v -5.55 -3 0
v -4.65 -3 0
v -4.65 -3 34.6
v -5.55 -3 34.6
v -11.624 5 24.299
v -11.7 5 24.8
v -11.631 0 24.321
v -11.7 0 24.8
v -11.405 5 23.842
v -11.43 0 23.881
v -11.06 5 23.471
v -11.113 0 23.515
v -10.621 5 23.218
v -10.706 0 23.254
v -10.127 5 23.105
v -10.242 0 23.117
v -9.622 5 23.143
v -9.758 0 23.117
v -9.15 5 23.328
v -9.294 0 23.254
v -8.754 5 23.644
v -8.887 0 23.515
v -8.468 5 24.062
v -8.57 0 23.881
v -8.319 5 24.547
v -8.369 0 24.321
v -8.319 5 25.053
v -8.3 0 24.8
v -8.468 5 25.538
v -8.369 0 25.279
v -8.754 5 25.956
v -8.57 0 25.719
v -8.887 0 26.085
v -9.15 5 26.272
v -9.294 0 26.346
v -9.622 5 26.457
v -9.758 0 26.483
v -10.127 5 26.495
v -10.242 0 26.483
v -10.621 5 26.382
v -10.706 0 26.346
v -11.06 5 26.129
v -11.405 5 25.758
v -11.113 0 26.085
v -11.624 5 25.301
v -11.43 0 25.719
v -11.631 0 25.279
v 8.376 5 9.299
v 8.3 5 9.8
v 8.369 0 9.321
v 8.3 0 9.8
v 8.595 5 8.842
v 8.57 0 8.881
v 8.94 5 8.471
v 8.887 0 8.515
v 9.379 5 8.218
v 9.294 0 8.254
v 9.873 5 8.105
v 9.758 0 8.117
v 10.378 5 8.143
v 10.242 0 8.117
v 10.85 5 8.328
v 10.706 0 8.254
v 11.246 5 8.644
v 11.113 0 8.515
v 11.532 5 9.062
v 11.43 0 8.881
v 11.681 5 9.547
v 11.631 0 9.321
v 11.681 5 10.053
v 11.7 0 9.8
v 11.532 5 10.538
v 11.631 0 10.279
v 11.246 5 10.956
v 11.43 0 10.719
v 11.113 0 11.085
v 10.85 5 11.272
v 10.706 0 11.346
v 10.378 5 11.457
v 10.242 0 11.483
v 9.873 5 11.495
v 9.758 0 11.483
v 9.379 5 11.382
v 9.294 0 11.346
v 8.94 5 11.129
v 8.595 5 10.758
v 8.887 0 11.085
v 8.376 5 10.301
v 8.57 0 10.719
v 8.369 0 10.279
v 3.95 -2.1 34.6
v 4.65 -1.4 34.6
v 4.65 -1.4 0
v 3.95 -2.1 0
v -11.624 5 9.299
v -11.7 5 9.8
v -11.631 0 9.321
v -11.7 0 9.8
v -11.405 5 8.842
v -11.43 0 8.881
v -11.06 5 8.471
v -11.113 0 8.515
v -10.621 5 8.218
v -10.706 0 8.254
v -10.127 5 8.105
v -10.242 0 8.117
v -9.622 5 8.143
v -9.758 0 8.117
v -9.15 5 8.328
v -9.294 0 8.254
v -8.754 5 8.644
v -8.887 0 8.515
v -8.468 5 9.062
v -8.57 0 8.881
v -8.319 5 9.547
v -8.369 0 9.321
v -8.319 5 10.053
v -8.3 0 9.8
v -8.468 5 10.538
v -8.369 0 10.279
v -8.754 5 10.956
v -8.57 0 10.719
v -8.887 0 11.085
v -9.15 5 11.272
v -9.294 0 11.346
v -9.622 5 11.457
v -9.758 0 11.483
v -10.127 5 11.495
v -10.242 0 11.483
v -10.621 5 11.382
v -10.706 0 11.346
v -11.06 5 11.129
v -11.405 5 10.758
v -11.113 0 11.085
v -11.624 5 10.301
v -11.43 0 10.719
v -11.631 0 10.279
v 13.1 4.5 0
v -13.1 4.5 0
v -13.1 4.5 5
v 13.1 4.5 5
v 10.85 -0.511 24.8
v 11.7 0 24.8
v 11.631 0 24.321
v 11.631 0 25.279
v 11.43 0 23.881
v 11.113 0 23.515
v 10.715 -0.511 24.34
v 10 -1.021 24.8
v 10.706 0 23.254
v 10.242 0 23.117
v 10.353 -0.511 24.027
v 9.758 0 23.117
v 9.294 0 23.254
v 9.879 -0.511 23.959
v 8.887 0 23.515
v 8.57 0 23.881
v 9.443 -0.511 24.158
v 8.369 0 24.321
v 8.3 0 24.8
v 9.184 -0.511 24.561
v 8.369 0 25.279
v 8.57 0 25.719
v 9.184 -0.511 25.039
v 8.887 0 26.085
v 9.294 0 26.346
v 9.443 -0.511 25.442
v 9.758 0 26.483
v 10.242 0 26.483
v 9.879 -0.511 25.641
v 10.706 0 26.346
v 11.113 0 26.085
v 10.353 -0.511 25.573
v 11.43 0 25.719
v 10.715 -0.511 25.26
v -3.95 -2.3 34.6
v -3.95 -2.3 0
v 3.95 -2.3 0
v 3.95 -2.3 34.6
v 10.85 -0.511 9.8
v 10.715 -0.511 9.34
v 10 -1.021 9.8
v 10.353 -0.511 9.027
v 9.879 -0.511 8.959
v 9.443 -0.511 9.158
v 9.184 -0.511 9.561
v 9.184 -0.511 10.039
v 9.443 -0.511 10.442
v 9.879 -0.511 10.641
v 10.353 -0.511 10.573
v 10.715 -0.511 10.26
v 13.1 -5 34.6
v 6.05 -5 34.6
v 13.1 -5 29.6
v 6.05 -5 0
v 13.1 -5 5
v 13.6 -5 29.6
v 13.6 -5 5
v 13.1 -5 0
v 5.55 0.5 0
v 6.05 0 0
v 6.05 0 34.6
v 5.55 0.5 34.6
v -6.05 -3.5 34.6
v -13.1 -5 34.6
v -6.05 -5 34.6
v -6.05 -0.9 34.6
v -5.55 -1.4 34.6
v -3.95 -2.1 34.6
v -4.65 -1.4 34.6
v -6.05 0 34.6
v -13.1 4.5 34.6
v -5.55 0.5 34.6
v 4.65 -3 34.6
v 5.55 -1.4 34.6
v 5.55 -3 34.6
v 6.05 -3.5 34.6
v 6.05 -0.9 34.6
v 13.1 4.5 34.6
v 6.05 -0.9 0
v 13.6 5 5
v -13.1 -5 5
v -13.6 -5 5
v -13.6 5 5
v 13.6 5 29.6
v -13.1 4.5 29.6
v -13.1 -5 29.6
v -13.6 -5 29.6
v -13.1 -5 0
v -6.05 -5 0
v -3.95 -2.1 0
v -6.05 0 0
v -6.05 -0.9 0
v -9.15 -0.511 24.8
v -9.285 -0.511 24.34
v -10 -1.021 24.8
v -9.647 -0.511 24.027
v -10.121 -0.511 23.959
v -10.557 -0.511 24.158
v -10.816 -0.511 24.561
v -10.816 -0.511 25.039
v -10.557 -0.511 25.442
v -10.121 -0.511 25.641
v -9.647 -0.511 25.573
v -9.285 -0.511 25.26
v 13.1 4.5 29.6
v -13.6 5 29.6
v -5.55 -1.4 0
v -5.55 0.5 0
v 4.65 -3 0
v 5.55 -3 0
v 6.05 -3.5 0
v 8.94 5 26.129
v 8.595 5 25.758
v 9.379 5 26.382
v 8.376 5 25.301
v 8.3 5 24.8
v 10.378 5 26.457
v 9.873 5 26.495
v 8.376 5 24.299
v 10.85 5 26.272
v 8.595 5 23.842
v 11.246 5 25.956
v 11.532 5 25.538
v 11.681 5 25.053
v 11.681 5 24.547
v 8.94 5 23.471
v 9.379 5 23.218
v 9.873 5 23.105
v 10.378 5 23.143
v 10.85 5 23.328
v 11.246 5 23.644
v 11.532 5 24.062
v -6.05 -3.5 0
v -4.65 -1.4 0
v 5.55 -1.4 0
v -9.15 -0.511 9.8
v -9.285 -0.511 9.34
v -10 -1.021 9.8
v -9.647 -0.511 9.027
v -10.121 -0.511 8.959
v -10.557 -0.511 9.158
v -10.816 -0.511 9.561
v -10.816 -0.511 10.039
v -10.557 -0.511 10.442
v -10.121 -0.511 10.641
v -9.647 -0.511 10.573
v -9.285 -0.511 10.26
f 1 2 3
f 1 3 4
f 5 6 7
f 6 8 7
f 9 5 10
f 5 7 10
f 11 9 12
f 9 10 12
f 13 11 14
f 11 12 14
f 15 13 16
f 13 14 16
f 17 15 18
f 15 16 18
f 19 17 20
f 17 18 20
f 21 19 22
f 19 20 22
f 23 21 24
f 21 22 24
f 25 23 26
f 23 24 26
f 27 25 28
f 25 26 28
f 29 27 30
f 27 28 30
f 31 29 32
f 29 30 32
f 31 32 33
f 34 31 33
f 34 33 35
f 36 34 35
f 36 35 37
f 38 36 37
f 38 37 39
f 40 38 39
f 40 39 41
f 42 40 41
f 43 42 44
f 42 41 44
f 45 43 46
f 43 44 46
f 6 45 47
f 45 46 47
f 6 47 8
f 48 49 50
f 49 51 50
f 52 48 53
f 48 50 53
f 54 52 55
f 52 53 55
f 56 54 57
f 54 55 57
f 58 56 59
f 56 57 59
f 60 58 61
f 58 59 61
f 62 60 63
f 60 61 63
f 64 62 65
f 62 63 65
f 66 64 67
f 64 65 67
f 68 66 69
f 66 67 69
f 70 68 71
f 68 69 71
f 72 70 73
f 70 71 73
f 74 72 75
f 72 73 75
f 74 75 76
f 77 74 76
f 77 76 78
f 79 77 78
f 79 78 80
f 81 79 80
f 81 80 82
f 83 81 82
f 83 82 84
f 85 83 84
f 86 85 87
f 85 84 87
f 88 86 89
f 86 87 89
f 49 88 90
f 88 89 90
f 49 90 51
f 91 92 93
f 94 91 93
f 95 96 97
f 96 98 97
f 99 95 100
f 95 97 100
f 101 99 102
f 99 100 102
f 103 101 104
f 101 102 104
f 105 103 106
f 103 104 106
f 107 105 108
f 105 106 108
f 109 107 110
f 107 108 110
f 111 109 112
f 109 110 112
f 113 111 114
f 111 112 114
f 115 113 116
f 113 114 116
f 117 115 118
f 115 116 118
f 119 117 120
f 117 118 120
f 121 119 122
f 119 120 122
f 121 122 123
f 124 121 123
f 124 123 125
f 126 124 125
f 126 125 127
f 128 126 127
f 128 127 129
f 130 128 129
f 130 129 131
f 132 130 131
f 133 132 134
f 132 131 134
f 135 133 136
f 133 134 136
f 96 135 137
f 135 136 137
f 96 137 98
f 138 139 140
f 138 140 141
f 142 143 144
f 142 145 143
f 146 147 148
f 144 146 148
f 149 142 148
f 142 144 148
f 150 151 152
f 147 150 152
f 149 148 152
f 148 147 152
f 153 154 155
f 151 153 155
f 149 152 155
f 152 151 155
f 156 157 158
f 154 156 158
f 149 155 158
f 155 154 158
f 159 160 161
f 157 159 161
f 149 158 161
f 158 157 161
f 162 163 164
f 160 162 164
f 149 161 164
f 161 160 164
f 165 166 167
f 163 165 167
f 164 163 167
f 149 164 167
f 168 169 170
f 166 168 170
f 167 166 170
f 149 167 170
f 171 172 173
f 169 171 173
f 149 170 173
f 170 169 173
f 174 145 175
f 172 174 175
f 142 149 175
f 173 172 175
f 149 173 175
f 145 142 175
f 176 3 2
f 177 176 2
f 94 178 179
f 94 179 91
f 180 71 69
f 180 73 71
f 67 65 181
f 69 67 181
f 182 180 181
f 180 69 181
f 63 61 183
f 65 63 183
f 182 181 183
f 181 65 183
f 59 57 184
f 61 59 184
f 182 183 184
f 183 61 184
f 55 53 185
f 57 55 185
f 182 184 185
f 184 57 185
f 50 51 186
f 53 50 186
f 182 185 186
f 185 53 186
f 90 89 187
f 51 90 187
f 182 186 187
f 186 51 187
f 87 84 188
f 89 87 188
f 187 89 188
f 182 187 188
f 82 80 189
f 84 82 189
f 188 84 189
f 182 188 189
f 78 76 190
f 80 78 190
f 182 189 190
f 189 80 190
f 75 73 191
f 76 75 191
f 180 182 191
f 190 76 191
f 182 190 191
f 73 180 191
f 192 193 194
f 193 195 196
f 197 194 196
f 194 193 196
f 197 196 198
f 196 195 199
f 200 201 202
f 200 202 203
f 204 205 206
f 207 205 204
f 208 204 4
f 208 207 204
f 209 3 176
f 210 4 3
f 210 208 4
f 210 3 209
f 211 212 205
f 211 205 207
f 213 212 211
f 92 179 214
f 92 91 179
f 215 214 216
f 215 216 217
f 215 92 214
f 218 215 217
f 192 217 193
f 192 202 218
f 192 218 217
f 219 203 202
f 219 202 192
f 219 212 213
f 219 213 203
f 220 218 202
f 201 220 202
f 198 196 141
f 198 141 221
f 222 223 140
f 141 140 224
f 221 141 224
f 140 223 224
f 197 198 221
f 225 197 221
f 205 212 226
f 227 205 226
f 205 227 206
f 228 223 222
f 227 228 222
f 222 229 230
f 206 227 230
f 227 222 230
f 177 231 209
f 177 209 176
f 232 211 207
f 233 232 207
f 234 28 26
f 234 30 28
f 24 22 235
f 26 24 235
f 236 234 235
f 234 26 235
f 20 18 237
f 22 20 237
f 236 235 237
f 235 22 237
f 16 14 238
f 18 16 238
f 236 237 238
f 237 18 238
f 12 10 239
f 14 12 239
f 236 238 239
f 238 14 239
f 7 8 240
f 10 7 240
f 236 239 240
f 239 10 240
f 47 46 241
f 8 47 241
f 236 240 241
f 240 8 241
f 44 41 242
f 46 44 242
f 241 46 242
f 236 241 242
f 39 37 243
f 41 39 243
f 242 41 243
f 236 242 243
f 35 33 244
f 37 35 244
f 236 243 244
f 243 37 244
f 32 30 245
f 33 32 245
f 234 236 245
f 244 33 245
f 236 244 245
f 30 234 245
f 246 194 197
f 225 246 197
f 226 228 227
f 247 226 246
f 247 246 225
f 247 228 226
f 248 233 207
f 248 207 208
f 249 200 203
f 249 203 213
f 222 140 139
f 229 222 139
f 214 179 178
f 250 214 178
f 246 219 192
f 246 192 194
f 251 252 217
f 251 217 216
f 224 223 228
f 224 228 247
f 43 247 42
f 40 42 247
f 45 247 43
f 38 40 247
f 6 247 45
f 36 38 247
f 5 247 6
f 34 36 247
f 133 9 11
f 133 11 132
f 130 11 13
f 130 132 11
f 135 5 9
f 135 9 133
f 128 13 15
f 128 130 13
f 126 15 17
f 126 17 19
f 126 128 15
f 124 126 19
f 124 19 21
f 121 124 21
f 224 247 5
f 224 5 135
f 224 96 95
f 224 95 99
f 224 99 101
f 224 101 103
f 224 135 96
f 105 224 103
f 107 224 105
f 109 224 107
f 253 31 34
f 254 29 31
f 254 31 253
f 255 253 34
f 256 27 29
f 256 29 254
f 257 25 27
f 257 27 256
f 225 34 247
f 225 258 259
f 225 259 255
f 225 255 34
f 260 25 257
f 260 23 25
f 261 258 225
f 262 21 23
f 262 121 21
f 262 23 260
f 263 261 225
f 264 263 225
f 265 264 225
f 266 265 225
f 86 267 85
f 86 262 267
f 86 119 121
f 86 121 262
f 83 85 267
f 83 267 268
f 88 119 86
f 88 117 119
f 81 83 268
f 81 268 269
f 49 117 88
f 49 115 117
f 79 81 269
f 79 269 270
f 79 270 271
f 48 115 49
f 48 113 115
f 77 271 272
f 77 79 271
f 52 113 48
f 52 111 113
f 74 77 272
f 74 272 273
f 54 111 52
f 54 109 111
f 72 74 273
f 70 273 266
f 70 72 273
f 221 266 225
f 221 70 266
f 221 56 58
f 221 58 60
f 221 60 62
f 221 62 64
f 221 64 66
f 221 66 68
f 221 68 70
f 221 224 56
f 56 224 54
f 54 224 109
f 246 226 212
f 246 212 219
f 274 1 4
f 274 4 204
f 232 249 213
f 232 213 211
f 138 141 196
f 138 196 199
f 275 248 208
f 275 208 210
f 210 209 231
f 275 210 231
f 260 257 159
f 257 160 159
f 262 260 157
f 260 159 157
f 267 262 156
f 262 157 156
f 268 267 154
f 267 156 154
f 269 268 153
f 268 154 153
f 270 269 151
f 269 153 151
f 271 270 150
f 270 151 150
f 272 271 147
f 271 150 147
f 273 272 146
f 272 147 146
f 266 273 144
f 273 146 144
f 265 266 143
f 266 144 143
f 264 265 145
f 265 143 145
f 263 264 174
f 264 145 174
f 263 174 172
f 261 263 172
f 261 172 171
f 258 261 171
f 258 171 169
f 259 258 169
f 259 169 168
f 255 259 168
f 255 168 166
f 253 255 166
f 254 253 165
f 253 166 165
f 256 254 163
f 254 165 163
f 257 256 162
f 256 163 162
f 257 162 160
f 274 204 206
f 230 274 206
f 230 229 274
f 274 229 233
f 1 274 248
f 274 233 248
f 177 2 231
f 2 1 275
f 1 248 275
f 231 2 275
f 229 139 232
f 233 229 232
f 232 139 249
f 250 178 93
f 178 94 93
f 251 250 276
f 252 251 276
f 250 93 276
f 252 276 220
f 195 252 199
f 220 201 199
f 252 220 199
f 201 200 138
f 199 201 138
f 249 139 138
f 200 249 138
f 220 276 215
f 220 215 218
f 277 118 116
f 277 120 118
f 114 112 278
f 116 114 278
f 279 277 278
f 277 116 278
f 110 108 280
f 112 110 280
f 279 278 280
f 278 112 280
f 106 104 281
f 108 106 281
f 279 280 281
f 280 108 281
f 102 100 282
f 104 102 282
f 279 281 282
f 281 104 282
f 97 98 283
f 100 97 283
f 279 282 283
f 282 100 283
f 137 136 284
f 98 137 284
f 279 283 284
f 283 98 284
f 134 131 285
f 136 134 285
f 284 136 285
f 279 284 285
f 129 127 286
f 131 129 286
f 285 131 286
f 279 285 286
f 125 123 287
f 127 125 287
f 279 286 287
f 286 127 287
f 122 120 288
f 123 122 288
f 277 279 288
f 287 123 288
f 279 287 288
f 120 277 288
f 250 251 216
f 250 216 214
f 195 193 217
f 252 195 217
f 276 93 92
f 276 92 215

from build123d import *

# Parameters (mm, degrees)
SKETCH1_W                = 27.2
SKETCH1_H                = 10
BOSS_EXTRUDE1_DEPTH      = 34.6
CUT_EXTRUDE1_DEPTH       = 1
CUT_EXTRUDE1_DEPTH_BACK  = 34.6
CHAMFER1_SIZE            = 0.7
M3_CLEARANCE_HOLE1_D     = 3.4
M3_CLEARANCE_HOLE1_DEPTH = 5
M3_CLEARANCE_HOLE1_TIP   = 1.021463052
SKETCH7_W                = 27.2
SKETCH7_H                = 5
CUT_EXTRUDE2_DEPTH       = 0.5
SKETCH8_W                = 5
SKETCH8_H                = 9.5
CUT_EXTRUDE3_DEPTH       = 0.5


with BuildPart() as part:
    # Sketch1 → Boss-Extrude1 (new body)
    with BuildSketch(Plane.XY):
        Rectangle(SKETCH1_W, SKETCH1_H)
    extrude(amount=BOSS_EXTRUDE1_DEPTH)

    # Sketch2 → Cut-Extrude1 (cut, two sides)
    with BuildSketch(Plane.XY.offset(34.6)) as cut_extrude1_sk:
        Polygon((-5.55, -3), (-6.05, -3.5), (-6.05, -5), (6.05, -5), (6.05, -3.5), (5.55, -3), (3.95, -3), (3.95, -1.4), (5.55, -1.4), (6.05, -0.9), (6.05, 0), (5.55, 0.5), (-5.55, 0.5), (-6.05, 0), (-6.05, -0.9), (-5.55, -1.4), (-3.95, -1.4), (-3.95, -3), align=None)
    extrude(amount=CUT_EXTRUDE1_DEPTH, mode=Mode.SUBTRACT)
    extrude(cut_extrude1_sk.sketch, amount=-CUT_EXTRUDE1_DEPTH_BACK, mode=Mode.SUBTRACT)

    # Chamfer1
    chamfer1_edges = [part.edges().sort_by_distance(p)[0] for p in [
        (-3.95, -3, 17.3),
        (3.95, -3, 17.3),
        (3.95, -1.4, 17.3),
        (-3.95, -1.4, 17.3),
    ]]
    chamfer(chamfer1_edges, length=CHAMFER1_SIZE)

    # M3 Clearance Hole1
    with Locations(Plane(origin=(0, 5, 0), x_dir=(1, 0, 0), z_dir=(0, 1, 0))):
        with Locations((-10, -24.8), (-10, -9.8), (10, -9.8), (10, -24.8)):
            Hole(M3_CLEARANCE_HOLE1_D / 2, depth=M3_CLEARANCE_HOLE1_DEPTH)
            with Locations((0, 0, -(M3_CLEARANCE_HOLE1_DEPTH + M3_CLEARANCE_HOLE1_TIP / 2))):  # 118° drill point
                Cone(0, M3_CLEARANCE_HOLE1_D / 2, M3_CLEARANCE_HOLE1_TIP, mode=Mode.SUBTRACT)

    # Sketch7 → Cut-Extrude2 (cut)
    with BuildSketch(Plane(origin=(0, 5, 0), x_dir=(1, 0, 0), z_dir=(0, 1, 0))):
        with Locations((0, -32.1)):
            Rectangle(SKETCH7_W, SKETCH7_H)
        with Locations((0, -2.5)):
            Rectangle(SKETCH7_W, SKETCH7_H)
    extrude(amount=-CUT_EXTRUDE2_DEPTH, mode=Mode.SUBTRACT)

    # Sketch8 → Cut-Extrude3 (cut)
    with BuildSketch(Plane(origin=(13.6, 0, 0), x_dir=(0, 0, -1), z_dir=(1, 0, 0))):
        with Locations((-32.1, -0.25)):
            Rectangle(SKETCH8_W, SKETCH8_H)
        with Locations((-2.5, -0.25)):
            Rectangle(SKETCH8_W, SKETCH8_H)
    cut_extrude3 = extrude(amount=-CUT_EXTRUDE3_DEPTH, mode=Mode.SUBTRACT)

    # Mirror1: Cut-Extrude3 across plane
    add(cut_extrude3.mirror(Plane(origin=(0, 0, 0), x_dir=(0, 0, 1), z_dir=(1, 0, 0))), mode=Mode.SUBTRACT)


solid = part.part
